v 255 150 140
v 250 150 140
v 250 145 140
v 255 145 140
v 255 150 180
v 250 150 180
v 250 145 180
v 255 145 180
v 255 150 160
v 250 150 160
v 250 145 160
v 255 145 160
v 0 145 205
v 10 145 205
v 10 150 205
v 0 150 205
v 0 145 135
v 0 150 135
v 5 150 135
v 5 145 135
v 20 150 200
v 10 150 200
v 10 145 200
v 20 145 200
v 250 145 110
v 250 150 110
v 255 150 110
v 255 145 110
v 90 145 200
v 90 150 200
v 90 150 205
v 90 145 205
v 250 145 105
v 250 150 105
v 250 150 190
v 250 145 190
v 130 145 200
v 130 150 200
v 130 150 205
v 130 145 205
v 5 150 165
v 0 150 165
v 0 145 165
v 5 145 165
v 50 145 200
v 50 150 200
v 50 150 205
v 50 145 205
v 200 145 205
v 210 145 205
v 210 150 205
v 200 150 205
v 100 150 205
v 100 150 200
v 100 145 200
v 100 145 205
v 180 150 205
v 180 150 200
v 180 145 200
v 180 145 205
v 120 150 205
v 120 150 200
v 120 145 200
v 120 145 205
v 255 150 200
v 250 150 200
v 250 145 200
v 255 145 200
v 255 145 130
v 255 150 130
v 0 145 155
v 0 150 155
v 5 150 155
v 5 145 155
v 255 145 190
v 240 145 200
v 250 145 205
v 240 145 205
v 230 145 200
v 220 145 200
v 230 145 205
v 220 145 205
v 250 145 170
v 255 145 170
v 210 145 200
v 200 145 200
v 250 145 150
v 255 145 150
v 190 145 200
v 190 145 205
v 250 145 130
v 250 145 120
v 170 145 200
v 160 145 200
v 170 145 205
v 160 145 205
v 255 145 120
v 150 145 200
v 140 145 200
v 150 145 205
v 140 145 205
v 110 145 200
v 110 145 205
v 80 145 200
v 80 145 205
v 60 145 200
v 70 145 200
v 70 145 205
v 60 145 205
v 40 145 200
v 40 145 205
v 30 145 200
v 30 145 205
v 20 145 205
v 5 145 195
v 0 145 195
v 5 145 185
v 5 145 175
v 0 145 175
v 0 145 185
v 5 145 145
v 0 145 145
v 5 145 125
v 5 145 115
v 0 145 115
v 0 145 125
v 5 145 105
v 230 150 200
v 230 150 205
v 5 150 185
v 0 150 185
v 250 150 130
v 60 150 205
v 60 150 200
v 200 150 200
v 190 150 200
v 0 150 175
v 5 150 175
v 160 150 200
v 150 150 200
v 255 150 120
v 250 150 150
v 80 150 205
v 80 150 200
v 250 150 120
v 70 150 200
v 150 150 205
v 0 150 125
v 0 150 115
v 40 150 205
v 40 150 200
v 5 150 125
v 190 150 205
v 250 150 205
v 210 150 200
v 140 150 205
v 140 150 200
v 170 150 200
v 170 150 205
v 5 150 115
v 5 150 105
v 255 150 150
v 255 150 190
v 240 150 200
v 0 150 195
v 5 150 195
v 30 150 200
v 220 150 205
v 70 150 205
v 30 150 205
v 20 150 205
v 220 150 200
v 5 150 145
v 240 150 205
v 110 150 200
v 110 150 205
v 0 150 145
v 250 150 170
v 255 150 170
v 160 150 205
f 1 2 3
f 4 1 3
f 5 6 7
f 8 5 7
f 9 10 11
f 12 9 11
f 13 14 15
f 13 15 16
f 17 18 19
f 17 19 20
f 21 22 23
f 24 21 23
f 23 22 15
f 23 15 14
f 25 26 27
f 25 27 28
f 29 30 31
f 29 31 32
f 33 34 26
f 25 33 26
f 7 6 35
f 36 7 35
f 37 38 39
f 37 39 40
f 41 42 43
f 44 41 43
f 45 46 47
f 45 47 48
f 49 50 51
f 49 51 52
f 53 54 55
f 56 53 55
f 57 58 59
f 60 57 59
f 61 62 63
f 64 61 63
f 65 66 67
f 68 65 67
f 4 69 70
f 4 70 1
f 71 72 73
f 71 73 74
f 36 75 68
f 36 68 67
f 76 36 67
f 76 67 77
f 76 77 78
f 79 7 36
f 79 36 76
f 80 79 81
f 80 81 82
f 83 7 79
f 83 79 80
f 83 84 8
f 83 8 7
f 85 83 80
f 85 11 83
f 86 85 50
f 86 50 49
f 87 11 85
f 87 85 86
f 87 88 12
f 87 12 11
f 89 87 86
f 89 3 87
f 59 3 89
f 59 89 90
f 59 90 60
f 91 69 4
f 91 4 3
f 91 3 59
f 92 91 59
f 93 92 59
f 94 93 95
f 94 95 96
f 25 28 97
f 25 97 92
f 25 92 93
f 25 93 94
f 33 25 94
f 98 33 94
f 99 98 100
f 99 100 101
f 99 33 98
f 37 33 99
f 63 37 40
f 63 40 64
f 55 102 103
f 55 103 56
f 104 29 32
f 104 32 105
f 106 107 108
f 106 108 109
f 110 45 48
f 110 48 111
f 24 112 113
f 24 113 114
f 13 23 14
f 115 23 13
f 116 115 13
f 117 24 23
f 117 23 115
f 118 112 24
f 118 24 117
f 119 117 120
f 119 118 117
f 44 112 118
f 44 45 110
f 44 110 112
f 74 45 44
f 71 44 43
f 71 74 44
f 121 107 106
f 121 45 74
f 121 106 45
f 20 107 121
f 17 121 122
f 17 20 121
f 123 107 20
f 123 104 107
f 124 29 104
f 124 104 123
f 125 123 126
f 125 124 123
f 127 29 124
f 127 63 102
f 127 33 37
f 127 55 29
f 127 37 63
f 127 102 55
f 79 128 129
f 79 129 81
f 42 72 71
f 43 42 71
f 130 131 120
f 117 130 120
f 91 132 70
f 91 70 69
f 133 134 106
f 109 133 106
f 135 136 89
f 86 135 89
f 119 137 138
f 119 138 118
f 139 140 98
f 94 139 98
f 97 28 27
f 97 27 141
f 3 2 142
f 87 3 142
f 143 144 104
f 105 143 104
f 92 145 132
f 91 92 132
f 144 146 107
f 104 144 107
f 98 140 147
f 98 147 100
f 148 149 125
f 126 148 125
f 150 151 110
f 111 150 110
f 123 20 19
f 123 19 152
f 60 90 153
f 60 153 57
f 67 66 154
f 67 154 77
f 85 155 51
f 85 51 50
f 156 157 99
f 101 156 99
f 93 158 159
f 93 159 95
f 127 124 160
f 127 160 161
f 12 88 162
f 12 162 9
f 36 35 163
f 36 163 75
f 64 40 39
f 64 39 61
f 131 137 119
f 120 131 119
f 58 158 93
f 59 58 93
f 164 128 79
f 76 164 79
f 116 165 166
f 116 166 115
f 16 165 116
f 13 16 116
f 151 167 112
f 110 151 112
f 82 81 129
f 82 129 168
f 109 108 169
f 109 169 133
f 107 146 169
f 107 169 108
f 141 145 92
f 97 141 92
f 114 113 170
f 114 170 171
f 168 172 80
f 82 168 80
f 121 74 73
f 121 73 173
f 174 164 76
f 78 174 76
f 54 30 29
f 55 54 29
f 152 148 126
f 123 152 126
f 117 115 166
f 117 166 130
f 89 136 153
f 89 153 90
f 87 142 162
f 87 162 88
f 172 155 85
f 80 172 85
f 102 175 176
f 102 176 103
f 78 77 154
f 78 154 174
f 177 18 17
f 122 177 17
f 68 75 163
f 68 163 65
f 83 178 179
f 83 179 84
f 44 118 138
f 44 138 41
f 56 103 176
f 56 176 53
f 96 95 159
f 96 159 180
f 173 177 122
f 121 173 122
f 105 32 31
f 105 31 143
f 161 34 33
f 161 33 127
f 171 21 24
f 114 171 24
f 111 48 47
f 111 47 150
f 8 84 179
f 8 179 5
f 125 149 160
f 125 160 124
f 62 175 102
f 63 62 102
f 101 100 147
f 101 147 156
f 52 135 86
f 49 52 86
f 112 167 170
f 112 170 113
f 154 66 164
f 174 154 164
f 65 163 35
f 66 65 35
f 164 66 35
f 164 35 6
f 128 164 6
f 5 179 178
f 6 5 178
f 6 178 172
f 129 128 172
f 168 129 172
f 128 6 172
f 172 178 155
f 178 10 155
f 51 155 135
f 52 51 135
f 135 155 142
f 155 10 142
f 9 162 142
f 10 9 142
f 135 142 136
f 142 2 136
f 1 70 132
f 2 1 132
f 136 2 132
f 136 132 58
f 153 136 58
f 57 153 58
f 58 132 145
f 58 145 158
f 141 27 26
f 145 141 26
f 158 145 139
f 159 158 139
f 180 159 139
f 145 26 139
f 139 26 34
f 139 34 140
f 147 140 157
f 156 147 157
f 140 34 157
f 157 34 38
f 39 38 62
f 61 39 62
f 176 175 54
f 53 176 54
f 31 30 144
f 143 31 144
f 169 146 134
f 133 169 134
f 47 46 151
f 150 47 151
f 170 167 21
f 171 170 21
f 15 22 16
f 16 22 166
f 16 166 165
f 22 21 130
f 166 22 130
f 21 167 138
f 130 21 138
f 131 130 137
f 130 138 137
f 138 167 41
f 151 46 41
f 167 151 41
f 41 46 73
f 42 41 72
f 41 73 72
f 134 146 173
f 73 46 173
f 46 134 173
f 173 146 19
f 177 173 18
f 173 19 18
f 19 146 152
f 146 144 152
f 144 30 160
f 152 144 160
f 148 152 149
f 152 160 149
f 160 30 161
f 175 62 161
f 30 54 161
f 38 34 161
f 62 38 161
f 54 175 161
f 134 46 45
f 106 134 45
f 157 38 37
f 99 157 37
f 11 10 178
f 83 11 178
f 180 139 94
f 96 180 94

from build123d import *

# Parameters (mm, degrees)
SKETCH051_W             = 95
SKETCH051_H             = 250
PAD035_DEPTH            = 5
SKETCH056_W             = 10
SKETCH056_H             = 5
PAD040_DEPTH            = 5
LINEARPATTERN031_COUNT  = 5
LINEARPATTERN031_PITCH  = 20
SKETCH062_W             = 10
SKETCH062_H             = 5
PAD043_DEPTH            = 5
LINEARPATTERN037_COUNT  = 13
LINEARPATTERN037_PITCH  = 20
SKETCH069_W             = 10
SKETCH069_H             = 5
POCKET022_DEPTH         = 5
LINEARPATTERN044_COUNT  = 5
LINEARPATTERN044_PITCH  = 20
BODY014_PITCH_ANGLE     = -90
BODY014_PLACEMENT_ANGLE = 90


with BuildPart() as part:
    # Sketch051 → Pad035 (new body)
    with BuildSketch(Plane.XY):
        Rectangle(SKETCH051_W, SKETCH051_H)
    extrude(amount=PAD035_DEPTH)

    # Sketch056 (on DatumPlane) → Pad040 (join)
    with BuildSketch(Plane.XZ.offset(125)):
        with Locations((-37.5, 2.5)):
            Rectangle(SKETCH056_W, SKETCH056_H)
    pad040 = extrude(amount=PAD040_DEPTH)

    # LinearPattern031: Pad040 ×5
    with Locations(*[(i * LINEARPATTERN031_PITCH, 0, 0) for i in range(1, LINEARPATTERN031_COUNT)]):
        add(pad040)

    # Sketch062 (on DatumPlane) → Pad043 (join)
    with BuildSketch(Plane.YZ.offset(47.5)):
        with Locations((-120, 2.5)):
            Rectangle(SKETCH062_W, SKETCH062_H)
    pad043 = extrude(amount=PAD043_DEPTH)

    # LinearPattern037: Pad043 ×13
    with Locations(*[(0, i * LINEARPATTERN037_PITCH, 0) for i in range(1, LINEARPATTERN037_COUNT)]):
        add(pad043)

    # Sketch069 (on DatumPlane) → Pocket022 (cut)
    with BuildSketch(Plane(origin=(0, 125, 0), x_dir=(-1, 0, 0), z_dir=(0, 1, 0))):
        with Locations((-37.5, 2.5)):
            Rectangle(SKETCH069_W, SKETCH069_H)
    pocket022 = extrude(amount=-POCKET022_DEPTH, mode=Mode.SUBTRACT)

    # LinearPattern044: Pocket022 ×5
    with Locations(*[(-i * LINEARPATTERN044_PITCH, 0, 0) for i in range(1, LINEARPATTERN044_COUNT)]):
        add(pocket022, mode=Mode.SUBTRACT)


with BuildPart() as part_1:
    # Body014 pitch: moved
    add(part.part.rotate(Axis((0, 0, 0), (0, 1, 0)), BODY014_PITCH_ANGLE))


with BuildPart() as part_2:
    # Body014 placement: moved
    add(part_1.part.moved(Location((125, 150, 152.5))).rotate(Axis((125, 150, 152.5), (0, 0, 1)), BODY014_PLACEMENT_ANGLE))


solid = part_2.part
